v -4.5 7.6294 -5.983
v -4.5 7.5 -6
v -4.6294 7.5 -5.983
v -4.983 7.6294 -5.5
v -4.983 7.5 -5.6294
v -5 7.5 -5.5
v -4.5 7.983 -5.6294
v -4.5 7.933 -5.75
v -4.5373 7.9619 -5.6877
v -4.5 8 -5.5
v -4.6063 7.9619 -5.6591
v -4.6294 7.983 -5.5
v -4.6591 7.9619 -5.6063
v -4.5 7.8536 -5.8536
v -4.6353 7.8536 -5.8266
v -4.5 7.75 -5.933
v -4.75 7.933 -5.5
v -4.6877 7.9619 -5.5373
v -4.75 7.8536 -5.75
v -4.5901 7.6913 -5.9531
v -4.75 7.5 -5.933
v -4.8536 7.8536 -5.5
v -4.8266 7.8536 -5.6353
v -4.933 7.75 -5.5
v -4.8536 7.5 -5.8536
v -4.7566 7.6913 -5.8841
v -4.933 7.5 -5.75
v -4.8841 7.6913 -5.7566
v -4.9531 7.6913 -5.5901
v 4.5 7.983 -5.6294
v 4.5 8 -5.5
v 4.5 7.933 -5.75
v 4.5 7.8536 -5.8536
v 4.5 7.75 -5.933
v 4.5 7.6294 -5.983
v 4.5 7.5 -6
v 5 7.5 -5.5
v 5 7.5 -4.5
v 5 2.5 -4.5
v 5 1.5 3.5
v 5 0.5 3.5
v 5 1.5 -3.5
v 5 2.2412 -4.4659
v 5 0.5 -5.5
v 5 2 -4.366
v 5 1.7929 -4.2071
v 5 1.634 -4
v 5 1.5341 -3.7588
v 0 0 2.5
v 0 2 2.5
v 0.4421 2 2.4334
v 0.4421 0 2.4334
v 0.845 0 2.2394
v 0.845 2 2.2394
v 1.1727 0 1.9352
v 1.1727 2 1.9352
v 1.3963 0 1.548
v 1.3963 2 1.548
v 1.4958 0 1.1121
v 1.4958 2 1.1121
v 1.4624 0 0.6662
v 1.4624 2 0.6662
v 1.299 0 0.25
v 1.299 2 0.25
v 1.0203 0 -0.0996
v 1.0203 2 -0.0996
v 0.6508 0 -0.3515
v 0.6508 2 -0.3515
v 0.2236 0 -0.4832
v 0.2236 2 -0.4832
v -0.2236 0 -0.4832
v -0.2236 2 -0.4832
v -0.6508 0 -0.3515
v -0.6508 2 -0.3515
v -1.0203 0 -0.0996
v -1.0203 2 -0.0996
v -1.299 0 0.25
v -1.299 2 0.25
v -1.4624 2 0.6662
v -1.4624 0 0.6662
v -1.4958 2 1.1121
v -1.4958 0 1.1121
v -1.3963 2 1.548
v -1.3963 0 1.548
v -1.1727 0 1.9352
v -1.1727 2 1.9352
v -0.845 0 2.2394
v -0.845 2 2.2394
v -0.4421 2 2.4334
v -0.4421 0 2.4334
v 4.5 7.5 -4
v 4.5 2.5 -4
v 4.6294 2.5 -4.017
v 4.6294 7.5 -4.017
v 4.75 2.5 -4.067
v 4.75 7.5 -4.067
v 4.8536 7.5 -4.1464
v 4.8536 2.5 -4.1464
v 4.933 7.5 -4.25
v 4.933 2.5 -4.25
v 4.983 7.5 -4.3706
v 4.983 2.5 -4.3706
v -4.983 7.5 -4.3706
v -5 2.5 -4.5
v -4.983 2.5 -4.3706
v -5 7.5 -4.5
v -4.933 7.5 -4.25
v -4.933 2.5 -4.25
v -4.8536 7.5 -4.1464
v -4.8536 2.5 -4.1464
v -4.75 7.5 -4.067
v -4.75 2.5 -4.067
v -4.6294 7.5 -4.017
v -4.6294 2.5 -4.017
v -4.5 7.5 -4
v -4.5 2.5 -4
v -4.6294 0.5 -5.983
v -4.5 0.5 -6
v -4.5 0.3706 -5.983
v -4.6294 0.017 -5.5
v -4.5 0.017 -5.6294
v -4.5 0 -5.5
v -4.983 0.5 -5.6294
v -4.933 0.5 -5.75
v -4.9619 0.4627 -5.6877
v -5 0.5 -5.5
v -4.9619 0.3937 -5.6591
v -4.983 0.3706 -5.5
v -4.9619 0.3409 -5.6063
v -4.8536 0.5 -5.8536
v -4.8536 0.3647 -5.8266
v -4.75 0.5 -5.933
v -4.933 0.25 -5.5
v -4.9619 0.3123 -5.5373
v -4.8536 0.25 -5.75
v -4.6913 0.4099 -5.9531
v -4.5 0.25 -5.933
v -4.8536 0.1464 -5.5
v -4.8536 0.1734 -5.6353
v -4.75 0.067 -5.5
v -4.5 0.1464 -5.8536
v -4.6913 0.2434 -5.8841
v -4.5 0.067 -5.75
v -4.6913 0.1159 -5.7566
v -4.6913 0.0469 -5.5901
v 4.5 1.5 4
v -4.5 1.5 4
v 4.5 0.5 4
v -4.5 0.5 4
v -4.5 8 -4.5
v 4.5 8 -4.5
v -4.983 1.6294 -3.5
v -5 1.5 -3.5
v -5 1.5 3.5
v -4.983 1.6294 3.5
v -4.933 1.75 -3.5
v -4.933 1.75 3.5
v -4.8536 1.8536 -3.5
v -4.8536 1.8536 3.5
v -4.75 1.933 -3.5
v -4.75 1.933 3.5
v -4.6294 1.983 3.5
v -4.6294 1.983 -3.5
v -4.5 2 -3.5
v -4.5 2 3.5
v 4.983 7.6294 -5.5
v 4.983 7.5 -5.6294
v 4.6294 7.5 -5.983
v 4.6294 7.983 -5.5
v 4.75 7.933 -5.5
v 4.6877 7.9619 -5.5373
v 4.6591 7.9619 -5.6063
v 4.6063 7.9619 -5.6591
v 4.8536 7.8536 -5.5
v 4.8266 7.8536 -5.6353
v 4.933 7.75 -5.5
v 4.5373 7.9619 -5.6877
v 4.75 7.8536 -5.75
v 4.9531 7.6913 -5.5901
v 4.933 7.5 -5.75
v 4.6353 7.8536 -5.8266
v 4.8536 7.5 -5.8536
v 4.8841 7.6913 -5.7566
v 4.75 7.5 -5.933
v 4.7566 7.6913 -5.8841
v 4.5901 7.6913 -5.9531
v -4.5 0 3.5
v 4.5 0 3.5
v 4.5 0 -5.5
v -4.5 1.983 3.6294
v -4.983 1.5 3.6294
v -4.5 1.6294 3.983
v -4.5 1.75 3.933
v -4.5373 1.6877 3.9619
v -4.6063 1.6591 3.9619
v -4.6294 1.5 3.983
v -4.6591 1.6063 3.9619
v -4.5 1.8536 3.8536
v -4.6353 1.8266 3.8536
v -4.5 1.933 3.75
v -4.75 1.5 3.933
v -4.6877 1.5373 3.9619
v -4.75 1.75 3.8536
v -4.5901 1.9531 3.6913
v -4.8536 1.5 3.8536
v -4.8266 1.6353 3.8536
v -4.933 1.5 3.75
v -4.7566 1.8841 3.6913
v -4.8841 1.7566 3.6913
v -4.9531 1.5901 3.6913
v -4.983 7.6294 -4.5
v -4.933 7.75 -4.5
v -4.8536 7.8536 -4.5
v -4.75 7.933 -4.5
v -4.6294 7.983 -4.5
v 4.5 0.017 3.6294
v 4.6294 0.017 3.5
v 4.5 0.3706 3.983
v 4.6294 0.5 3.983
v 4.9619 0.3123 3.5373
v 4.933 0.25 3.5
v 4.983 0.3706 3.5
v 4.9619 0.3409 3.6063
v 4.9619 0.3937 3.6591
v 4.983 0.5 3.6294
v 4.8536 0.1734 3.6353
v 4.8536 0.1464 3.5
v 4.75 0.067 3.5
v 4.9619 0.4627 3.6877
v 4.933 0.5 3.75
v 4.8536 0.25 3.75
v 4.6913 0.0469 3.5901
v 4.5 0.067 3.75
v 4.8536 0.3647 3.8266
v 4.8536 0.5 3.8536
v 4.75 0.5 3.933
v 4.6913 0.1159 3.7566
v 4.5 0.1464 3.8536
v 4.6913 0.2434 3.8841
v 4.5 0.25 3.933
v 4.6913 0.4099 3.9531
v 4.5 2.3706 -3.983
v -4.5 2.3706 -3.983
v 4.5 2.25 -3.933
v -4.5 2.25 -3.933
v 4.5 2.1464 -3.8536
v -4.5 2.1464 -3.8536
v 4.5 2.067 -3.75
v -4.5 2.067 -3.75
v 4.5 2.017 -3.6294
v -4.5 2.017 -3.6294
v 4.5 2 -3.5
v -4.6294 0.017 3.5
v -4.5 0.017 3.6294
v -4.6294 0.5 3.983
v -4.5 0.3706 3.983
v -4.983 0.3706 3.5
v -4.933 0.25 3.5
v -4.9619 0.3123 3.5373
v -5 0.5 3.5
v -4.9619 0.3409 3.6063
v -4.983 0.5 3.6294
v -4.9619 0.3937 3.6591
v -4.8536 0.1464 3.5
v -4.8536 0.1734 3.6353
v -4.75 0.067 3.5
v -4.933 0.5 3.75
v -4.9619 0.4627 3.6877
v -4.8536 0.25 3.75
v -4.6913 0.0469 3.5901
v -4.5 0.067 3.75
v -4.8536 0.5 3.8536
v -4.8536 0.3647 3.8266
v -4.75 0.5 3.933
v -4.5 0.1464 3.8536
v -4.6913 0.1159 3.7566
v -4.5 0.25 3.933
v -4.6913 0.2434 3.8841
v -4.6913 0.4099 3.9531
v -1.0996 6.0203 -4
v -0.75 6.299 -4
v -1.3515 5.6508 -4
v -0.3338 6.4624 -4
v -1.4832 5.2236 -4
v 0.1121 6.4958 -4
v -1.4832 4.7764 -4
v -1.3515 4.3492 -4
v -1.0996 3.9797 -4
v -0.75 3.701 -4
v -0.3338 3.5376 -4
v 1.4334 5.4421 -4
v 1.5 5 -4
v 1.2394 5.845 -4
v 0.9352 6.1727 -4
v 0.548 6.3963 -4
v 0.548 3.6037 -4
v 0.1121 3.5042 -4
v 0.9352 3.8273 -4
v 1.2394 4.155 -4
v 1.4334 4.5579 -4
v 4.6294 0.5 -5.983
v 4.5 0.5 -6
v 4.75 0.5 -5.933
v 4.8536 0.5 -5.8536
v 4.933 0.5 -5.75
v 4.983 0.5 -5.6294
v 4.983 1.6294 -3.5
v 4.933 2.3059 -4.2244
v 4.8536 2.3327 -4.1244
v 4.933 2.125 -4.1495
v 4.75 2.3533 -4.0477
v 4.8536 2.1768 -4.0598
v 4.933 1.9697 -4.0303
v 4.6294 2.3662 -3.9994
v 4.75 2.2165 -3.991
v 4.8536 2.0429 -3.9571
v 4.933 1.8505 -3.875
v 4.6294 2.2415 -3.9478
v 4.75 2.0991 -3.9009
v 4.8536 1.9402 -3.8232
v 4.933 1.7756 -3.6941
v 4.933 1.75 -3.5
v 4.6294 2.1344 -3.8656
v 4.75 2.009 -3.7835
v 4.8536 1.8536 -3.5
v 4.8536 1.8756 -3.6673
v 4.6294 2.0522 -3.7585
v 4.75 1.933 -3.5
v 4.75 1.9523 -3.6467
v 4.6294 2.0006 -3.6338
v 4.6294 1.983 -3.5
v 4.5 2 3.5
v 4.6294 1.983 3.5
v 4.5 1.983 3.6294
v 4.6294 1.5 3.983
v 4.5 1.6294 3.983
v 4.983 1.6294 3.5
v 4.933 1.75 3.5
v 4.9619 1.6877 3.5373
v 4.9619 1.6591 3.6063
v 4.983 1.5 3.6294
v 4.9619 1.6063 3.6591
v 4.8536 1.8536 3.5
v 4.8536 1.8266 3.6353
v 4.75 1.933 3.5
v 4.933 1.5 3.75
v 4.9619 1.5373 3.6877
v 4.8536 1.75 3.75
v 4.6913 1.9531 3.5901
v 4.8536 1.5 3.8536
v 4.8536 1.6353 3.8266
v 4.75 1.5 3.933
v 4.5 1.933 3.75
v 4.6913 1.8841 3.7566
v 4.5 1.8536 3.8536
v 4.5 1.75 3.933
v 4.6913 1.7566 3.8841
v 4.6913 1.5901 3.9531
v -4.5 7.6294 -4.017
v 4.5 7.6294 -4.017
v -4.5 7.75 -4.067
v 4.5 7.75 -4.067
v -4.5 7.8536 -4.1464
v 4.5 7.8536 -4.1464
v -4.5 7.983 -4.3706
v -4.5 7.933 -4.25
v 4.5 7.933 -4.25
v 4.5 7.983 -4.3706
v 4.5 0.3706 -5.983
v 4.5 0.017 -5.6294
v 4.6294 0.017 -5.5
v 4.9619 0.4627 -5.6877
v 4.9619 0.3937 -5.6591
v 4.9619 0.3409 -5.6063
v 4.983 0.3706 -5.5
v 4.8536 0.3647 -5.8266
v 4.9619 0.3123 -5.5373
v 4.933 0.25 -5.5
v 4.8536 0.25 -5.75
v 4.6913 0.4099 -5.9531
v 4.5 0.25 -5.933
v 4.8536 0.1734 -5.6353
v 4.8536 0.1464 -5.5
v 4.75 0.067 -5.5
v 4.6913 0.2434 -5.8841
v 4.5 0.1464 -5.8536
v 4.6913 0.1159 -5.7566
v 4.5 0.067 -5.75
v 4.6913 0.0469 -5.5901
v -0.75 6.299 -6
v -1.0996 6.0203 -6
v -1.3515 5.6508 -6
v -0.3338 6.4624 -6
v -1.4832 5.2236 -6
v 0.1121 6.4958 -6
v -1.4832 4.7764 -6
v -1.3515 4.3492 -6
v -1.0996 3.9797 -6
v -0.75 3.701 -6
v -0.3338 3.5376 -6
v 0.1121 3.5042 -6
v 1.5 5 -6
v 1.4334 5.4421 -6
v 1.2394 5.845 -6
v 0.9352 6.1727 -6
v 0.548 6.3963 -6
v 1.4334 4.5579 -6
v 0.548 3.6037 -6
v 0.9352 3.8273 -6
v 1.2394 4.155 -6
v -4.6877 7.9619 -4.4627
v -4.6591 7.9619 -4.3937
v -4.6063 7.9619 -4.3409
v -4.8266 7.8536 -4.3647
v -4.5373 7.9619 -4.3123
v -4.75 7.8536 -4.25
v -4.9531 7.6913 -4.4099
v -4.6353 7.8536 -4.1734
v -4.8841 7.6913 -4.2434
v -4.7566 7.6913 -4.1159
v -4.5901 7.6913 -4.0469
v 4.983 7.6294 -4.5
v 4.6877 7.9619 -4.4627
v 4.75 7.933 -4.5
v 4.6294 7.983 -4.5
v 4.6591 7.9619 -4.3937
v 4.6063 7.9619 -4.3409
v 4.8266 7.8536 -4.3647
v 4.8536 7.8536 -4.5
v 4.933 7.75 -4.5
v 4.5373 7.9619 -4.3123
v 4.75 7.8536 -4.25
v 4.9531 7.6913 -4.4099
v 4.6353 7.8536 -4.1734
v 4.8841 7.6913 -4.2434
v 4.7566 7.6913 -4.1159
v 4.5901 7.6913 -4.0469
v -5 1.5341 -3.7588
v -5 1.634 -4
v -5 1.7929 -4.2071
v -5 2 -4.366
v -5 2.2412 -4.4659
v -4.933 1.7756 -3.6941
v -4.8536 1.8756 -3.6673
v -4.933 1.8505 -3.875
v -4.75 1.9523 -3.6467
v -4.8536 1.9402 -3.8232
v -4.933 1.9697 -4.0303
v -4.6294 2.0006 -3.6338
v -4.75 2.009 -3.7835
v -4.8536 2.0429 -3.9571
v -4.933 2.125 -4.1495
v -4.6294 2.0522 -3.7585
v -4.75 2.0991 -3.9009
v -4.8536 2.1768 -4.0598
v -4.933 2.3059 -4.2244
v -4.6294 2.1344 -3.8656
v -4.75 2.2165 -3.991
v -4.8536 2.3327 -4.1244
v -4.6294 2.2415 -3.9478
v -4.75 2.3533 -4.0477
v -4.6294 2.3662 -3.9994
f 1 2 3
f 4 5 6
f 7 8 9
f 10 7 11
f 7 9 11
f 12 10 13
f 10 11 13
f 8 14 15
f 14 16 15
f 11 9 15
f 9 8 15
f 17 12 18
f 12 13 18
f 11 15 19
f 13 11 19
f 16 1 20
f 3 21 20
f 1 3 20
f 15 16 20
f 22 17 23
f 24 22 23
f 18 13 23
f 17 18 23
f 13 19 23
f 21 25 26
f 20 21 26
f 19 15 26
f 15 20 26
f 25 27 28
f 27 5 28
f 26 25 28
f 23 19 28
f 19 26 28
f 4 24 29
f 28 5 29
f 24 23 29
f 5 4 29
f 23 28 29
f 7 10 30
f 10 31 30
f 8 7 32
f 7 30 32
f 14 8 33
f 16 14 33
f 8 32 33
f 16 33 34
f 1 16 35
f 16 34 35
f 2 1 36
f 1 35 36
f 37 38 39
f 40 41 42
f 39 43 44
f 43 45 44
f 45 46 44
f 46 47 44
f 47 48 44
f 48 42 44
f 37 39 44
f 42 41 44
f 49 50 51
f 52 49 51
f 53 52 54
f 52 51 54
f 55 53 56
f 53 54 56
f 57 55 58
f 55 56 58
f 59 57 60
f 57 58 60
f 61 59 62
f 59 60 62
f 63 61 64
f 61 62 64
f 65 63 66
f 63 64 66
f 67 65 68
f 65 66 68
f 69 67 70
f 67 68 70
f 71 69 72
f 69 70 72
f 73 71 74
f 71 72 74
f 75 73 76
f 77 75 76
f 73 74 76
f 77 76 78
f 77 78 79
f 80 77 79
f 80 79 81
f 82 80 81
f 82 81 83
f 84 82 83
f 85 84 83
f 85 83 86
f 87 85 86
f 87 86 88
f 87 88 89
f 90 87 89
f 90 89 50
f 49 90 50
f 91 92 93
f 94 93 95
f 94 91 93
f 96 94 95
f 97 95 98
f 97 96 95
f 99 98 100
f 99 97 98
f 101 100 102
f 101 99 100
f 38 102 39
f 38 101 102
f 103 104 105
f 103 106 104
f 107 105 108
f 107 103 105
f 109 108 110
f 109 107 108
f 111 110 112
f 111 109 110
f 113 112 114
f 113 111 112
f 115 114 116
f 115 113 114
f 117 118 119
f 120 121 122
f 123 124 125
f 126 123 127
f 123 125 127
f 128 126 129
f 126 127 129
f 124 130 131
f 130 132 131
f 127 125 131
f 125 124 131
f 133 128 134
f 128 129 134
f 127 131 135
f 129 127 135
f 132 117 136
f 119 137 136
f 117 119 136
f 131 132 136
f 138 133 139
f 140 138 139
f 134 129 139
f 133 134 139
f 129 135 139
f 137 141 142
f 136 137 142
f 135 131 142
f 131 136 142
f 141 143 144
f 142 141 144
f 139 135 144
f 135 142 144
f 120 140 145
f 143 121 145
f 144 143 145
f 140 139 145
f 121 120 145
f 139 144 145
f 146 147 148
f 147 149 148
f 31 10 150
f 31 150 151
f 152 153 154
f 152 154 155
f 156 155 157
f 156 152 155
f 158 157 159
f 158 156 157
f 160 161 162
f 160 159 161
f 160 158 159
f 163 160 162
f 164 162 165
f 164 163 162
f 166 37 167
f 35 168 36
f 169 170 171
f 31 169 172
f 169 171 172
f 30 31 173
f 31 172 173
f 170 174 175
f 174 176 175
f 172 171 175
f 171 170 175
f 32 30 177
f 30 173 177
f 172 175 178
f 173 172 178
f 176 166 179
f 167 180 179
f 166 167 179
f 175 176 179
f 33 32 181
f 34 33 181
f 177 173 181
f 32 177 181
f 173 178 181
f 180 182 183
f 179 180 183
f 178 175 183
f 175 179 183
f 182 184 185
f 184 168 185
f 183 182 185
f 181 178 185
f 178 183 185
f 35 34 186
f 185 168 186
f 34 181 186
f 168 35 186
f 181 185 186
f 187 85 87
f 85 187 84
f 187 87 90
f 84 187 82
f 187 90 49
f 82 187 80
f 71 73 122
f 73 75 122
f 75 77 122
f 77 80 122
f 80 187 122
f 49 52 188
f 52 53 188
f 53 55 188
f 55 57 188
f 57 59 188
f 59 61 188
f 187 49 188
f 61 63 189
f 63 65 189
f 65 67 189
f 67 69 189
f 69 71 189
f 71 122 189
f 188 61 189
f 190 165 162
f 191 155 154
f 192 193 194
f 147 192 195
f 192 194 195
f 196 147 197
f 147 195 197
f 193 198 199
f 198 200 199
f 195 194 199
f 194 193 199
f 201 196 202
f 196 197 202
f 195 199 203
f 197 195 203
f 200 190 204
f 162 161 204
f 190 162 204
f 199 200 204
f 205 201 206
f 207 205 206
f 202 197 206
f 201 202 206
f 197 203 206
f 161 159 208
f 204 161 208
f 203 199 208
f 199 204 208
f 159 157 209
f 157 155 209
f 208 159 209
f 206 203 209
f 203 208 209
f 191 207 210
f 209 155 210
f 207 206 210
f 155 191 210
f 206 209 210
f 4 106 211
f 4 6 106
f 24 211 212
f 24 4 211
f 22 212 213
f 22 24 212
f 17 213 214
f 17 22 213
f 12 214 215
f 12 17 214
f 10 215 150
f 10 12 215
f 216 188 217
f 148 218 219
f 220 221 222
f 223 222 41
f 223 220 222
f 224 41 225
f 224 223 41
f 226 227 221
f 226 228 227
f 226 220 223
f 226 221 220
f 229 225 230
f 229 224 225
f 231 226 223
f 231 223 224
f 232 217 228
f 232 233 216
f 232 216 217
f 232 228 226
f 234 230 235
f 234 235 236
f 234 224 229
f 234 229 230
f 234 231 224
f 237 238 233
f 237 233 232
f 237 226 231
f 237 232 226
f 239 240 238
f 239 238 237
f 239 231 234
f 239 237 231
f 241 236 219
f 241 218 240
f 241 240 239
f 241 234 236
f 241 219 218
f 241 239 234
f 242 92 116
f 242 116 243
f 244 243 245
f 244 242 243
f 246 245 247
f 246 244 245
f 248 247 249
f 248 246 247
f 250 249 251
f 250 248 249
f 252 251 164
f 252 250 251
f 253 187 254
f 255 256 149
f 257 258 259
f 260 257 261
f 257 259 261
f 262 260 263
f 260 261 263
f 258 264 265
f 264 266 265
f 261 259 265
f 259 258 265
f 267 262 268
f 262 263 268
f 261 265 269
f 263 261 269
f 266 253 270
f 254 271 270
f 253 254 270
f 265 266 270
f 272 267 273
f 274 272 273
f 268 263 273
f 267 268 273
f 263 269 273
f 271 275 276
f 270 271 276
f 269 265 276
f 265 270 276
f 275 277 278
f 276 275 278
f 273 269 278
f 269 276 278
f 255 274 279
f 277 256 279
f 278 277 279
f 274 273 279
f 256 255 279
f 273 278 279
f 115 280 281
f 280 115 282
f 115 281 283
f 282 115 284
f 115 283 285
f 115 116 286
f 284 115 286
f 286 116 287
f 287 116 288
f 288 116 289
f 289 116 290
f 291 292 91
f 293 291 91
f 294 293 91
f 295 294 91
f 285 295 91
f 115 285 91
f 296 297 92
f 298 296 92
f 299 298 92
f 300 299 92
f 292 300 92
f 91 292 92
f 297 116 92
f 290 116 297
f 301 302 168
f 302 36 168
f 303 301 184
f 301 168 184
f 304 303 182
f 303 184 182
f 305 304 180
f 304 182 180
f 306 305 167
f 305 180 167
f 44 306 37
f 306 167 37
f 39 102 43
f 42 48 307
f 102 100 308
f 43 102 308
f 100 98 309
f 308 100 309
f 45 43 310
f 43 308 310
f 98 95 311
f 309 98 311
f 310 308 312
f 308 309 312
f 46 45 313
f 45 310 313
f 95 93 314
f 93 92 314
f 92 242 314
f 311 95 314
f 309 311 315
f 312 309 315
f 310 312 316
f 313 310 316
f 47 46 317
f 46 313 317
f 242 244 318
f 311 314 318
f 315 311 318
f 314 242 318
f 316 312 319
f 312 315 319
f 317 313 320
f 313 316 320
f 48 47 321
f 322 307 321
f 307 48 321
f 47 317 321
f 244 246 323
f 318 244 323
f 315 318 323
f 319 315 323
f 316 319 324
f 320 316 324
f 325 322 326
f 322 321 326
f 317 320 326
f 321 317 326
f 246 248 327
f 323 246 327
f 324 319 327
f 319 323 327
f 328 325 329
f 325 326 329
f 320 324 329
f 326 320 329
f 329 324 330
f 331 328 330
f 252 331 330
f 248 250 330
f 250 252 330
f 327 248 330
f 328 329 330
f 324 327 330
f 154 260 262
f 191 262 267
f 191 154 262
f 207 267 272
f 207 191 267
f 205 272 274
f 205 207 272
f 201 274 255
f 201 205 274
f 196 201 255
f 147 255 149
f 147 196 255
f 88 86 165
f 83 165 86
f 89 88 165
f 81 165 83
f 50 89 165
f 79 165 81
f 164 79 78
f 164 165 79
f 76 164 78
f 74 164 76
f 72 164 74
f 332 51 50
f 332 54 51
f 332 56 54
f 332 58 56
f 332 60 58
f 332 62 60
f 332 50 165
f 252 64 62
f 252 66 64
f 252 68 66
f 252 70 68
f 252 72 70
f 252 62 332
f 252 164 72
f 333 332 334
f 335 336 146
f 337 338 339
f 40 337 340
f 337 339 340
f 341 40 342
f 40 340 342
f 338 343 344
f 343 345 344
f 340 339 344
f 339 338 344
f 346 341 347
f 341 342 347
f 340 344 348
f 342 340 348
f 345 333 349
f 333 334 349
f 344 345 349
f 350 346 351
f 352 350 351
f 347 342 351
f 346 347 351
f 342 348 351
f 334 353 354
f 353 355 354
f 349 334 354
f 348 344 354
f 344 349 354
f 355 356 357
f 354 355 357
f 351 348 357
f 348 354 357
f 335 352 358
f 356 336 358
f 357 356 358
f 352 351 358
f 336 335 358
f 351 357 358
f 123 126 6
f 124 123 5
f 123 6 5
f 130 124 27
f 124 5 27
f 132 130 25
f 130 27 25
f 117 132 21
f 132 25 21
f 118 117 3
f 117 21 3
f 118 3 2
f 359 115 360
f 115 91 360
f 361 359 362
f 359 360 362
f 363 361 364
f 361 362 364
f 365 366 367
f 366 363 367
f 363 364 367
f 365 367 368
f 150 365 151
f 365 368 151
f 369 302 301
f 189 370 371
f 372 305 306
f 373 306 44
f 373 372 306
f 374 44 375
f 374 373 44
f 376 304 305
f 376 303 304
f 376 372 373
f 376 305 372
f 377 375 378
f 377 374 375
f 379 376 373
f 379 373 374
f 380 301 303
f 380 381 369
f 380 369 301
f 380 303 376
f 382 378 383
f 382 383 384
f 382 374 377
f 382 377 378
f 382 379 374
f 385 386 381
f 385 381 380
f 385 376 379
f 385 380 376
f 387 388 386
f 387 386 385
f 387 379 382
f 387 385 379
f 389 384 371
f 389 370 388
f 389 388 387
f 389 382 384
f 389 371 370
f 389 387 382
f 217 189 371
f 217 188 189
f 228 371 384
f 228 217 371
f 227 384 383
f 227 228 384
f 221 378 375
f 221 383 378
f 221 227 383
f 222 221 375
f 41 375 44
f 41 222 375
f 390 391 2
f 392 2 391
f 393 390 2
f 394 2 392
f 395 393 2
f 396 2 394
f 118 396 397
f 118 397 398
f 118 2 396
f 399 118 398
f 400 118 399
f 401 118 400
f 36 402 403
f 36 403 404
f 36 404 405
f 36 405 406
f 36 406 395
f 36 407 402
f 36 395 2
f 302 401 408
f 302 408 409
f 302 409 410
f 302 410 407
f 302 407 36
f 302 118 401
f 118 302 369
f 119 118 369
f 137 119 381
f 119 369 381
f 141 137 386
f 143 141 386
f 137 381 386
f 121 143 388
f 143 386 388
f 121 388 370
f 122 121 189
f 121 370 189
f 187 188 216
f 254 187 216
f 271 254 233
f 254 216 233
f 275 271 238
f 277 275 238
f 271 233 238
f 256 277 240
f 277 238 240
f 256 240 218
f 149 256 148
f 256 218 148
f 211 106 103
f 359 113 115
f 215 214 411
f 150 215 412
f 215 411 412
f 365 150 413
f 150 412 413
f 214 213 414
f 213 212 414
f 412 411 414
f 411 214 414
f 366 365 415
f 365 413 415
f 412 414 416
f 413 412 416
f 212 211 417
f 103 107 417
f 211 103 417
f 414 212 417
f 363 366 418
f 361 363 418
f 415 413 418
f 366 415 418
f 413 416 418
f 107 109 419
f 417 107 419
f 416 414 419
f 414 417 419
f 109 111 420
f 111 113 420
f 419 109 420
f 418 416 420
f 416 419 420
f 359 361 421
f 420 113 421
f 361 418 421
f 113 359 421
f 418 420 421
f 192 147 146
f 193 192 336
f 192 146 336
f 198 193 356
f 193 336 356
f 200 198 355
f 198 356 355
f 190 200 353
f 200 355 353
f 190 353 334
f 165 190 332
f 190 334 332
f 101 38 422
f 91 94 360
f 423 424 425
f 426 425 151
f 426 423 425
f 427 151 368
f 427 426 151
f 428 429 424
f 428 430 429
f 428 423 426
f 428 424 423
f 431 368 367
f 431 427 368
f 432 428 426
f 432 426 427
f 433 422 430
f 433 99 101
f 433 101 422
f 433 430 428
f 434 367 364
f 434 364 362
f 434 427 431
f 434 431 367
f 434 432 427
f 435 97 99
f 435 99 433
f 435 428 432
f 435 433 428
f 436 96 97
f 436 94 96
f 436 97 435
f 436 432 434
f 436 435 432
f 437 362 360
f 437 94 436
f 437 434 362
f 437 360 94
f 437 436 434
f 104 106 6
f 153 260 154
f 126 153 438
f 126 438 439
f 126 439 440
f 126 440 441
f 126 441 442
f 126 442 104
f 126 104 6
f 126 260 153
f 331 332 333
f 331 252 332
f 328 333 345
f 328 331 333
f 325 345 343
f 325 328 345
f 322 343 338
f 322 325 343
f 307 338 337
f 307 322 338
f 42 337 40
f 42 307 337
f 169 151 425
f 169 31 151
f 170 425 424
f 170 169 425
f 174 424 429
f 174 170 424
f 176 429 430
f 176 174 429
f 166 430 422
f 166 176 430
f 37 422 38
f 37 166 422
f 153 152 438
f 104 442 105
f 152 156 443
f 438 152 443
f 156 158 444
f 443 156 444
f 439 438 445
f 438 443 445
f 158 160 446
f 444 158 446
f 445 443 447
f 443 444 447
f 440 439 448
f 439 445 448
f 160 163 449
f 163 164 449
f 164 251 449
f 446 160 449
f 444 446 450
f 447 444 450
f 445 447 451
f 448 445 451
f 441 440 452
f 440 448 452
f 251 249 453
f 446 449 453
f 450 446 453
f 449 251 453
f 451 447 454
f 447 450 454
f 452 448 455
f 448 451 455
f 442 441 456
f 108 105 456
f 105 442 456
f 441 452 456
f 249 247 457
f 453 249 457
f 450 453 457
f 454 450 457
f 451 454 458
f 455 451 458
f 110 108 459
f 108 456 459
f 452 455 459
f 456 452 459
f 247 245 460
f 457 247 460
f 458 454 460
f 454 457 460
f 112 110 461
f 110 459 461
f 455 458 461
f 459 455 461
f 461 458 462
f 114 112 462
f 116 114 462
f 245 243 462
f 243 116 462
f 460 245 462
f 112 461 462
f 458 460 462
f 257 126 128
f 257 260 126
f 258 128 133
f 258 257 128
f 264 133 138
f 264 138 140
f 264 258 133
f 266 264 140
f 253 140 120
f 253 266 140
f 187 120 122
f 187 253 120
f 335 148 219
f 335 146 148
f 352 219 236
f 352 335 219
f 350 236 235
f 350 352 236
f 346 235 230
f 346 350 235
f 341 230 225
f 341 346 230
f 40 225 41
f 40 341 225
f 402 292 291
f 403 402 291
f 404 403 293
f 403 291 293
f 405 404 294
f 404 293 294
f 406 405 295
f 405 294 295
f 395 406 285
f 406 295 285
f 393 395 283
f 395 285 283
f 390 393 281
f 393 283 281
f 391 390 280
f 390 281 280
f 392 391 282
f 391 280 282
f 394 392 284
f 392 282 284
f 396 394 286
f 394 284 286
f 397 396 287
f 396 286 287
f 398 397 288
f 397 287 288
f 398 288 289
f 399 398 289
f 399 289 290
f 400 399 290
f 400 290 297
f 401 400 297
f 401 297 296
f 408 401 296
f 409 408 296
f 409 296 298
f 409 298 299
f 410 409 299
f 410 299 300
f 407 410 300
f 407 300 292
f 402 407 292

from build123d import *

# Parameters (mm, degrees)
SKETCH1_W           = 10
SKETCH1_H           = 8
BOSS_EXTRUDE1_DEPTH = 2
SKETCH2_W           = 10
SKETCH2_H           = 2
BOSS_EXTRUDE2_DEPTH = 8
SKETCH3_R           = 1.5
CUT_EXTRUDE1_DEPTH  = 10.848857802
SKETCH4_R           = 1.5
CUT_EXTRUDE2_DEPTH  = 13.369316877
FILLET1_R           = 0.5


with BuildPart() as part:
    # Sketch1 → Boss-Extrude1 (new body)
    with BuildSketch(Plane(origin=(0, 0, 0), x_dir=(1, 0, 0), z_dir=(0, 1, 0))):
        Rectangle(SKETCH1_W, SKETCH1_H)
    extrude(amount=BOSS_EXTRUDE1_DEPTH)

    # Sketch2 → Boss-Extrude2 (add)
    with BuildSketch(Plane(origin=(0, 0, 0), x_dir=(1, 0, 0), z_dir=(0, 1, 0))):
        with Locations((0, 5)):
            Rectangle(SKETCH2_W, SKETCH2_H)
    extrude(amount=BOSS_EXTRUDE2_DEPTH)

    # Sketch3 → Cut-Extrude1 (cut, through all)
    with BuildSketch(Plane(origin=(0, 2, 0), x_dir=(1, 0, 0), z_dir=(0, 1, 0))):
        with Locations(Location((0, -1, 0), (0, 0, 270))):
            Circle(SKETCH3_R)
    extrude(amount=-CUT_EXTRUDE1_DEPTH, mode=Mode.SUBTRACT)

    # Sketch4 → Cut-Extrude2 (cut, through all)
    with BuildSketch(Plane.XY.offset(-4)):
        with Locations((0, 5)):
            Circle(SKETCH4_R)
    extrude(amount=-CUT_EXTRUDE2_DEPTH, mode=Mode.SUBTRACT)

    # Fillet1
    fillet1_edges = [part.edges().sort_by_distance(p)[0] for p in [
        (-5, 2, 0),
        (5, 5, -4),
        (0, 0, -6),
        (5, 4, -6),
        (-5, 4, -6),
        (-5, 5, -4),
        (5, 8, -5),
        (0, 8, -6),
        (0, 2, 4),
        (-5, 8, -5),
        (0, 8, -4),
        (5, 2, 0),
        (0, 0, 4),
        (-5, 0, -1),
        (5, 0, -1),
        (5, 1, 4),
        (-5, 1, 4),
        (0, 2, -4),
    ]]
    fillet(fillet1_edges, radius=FILLET1_R)


solid = part.part
